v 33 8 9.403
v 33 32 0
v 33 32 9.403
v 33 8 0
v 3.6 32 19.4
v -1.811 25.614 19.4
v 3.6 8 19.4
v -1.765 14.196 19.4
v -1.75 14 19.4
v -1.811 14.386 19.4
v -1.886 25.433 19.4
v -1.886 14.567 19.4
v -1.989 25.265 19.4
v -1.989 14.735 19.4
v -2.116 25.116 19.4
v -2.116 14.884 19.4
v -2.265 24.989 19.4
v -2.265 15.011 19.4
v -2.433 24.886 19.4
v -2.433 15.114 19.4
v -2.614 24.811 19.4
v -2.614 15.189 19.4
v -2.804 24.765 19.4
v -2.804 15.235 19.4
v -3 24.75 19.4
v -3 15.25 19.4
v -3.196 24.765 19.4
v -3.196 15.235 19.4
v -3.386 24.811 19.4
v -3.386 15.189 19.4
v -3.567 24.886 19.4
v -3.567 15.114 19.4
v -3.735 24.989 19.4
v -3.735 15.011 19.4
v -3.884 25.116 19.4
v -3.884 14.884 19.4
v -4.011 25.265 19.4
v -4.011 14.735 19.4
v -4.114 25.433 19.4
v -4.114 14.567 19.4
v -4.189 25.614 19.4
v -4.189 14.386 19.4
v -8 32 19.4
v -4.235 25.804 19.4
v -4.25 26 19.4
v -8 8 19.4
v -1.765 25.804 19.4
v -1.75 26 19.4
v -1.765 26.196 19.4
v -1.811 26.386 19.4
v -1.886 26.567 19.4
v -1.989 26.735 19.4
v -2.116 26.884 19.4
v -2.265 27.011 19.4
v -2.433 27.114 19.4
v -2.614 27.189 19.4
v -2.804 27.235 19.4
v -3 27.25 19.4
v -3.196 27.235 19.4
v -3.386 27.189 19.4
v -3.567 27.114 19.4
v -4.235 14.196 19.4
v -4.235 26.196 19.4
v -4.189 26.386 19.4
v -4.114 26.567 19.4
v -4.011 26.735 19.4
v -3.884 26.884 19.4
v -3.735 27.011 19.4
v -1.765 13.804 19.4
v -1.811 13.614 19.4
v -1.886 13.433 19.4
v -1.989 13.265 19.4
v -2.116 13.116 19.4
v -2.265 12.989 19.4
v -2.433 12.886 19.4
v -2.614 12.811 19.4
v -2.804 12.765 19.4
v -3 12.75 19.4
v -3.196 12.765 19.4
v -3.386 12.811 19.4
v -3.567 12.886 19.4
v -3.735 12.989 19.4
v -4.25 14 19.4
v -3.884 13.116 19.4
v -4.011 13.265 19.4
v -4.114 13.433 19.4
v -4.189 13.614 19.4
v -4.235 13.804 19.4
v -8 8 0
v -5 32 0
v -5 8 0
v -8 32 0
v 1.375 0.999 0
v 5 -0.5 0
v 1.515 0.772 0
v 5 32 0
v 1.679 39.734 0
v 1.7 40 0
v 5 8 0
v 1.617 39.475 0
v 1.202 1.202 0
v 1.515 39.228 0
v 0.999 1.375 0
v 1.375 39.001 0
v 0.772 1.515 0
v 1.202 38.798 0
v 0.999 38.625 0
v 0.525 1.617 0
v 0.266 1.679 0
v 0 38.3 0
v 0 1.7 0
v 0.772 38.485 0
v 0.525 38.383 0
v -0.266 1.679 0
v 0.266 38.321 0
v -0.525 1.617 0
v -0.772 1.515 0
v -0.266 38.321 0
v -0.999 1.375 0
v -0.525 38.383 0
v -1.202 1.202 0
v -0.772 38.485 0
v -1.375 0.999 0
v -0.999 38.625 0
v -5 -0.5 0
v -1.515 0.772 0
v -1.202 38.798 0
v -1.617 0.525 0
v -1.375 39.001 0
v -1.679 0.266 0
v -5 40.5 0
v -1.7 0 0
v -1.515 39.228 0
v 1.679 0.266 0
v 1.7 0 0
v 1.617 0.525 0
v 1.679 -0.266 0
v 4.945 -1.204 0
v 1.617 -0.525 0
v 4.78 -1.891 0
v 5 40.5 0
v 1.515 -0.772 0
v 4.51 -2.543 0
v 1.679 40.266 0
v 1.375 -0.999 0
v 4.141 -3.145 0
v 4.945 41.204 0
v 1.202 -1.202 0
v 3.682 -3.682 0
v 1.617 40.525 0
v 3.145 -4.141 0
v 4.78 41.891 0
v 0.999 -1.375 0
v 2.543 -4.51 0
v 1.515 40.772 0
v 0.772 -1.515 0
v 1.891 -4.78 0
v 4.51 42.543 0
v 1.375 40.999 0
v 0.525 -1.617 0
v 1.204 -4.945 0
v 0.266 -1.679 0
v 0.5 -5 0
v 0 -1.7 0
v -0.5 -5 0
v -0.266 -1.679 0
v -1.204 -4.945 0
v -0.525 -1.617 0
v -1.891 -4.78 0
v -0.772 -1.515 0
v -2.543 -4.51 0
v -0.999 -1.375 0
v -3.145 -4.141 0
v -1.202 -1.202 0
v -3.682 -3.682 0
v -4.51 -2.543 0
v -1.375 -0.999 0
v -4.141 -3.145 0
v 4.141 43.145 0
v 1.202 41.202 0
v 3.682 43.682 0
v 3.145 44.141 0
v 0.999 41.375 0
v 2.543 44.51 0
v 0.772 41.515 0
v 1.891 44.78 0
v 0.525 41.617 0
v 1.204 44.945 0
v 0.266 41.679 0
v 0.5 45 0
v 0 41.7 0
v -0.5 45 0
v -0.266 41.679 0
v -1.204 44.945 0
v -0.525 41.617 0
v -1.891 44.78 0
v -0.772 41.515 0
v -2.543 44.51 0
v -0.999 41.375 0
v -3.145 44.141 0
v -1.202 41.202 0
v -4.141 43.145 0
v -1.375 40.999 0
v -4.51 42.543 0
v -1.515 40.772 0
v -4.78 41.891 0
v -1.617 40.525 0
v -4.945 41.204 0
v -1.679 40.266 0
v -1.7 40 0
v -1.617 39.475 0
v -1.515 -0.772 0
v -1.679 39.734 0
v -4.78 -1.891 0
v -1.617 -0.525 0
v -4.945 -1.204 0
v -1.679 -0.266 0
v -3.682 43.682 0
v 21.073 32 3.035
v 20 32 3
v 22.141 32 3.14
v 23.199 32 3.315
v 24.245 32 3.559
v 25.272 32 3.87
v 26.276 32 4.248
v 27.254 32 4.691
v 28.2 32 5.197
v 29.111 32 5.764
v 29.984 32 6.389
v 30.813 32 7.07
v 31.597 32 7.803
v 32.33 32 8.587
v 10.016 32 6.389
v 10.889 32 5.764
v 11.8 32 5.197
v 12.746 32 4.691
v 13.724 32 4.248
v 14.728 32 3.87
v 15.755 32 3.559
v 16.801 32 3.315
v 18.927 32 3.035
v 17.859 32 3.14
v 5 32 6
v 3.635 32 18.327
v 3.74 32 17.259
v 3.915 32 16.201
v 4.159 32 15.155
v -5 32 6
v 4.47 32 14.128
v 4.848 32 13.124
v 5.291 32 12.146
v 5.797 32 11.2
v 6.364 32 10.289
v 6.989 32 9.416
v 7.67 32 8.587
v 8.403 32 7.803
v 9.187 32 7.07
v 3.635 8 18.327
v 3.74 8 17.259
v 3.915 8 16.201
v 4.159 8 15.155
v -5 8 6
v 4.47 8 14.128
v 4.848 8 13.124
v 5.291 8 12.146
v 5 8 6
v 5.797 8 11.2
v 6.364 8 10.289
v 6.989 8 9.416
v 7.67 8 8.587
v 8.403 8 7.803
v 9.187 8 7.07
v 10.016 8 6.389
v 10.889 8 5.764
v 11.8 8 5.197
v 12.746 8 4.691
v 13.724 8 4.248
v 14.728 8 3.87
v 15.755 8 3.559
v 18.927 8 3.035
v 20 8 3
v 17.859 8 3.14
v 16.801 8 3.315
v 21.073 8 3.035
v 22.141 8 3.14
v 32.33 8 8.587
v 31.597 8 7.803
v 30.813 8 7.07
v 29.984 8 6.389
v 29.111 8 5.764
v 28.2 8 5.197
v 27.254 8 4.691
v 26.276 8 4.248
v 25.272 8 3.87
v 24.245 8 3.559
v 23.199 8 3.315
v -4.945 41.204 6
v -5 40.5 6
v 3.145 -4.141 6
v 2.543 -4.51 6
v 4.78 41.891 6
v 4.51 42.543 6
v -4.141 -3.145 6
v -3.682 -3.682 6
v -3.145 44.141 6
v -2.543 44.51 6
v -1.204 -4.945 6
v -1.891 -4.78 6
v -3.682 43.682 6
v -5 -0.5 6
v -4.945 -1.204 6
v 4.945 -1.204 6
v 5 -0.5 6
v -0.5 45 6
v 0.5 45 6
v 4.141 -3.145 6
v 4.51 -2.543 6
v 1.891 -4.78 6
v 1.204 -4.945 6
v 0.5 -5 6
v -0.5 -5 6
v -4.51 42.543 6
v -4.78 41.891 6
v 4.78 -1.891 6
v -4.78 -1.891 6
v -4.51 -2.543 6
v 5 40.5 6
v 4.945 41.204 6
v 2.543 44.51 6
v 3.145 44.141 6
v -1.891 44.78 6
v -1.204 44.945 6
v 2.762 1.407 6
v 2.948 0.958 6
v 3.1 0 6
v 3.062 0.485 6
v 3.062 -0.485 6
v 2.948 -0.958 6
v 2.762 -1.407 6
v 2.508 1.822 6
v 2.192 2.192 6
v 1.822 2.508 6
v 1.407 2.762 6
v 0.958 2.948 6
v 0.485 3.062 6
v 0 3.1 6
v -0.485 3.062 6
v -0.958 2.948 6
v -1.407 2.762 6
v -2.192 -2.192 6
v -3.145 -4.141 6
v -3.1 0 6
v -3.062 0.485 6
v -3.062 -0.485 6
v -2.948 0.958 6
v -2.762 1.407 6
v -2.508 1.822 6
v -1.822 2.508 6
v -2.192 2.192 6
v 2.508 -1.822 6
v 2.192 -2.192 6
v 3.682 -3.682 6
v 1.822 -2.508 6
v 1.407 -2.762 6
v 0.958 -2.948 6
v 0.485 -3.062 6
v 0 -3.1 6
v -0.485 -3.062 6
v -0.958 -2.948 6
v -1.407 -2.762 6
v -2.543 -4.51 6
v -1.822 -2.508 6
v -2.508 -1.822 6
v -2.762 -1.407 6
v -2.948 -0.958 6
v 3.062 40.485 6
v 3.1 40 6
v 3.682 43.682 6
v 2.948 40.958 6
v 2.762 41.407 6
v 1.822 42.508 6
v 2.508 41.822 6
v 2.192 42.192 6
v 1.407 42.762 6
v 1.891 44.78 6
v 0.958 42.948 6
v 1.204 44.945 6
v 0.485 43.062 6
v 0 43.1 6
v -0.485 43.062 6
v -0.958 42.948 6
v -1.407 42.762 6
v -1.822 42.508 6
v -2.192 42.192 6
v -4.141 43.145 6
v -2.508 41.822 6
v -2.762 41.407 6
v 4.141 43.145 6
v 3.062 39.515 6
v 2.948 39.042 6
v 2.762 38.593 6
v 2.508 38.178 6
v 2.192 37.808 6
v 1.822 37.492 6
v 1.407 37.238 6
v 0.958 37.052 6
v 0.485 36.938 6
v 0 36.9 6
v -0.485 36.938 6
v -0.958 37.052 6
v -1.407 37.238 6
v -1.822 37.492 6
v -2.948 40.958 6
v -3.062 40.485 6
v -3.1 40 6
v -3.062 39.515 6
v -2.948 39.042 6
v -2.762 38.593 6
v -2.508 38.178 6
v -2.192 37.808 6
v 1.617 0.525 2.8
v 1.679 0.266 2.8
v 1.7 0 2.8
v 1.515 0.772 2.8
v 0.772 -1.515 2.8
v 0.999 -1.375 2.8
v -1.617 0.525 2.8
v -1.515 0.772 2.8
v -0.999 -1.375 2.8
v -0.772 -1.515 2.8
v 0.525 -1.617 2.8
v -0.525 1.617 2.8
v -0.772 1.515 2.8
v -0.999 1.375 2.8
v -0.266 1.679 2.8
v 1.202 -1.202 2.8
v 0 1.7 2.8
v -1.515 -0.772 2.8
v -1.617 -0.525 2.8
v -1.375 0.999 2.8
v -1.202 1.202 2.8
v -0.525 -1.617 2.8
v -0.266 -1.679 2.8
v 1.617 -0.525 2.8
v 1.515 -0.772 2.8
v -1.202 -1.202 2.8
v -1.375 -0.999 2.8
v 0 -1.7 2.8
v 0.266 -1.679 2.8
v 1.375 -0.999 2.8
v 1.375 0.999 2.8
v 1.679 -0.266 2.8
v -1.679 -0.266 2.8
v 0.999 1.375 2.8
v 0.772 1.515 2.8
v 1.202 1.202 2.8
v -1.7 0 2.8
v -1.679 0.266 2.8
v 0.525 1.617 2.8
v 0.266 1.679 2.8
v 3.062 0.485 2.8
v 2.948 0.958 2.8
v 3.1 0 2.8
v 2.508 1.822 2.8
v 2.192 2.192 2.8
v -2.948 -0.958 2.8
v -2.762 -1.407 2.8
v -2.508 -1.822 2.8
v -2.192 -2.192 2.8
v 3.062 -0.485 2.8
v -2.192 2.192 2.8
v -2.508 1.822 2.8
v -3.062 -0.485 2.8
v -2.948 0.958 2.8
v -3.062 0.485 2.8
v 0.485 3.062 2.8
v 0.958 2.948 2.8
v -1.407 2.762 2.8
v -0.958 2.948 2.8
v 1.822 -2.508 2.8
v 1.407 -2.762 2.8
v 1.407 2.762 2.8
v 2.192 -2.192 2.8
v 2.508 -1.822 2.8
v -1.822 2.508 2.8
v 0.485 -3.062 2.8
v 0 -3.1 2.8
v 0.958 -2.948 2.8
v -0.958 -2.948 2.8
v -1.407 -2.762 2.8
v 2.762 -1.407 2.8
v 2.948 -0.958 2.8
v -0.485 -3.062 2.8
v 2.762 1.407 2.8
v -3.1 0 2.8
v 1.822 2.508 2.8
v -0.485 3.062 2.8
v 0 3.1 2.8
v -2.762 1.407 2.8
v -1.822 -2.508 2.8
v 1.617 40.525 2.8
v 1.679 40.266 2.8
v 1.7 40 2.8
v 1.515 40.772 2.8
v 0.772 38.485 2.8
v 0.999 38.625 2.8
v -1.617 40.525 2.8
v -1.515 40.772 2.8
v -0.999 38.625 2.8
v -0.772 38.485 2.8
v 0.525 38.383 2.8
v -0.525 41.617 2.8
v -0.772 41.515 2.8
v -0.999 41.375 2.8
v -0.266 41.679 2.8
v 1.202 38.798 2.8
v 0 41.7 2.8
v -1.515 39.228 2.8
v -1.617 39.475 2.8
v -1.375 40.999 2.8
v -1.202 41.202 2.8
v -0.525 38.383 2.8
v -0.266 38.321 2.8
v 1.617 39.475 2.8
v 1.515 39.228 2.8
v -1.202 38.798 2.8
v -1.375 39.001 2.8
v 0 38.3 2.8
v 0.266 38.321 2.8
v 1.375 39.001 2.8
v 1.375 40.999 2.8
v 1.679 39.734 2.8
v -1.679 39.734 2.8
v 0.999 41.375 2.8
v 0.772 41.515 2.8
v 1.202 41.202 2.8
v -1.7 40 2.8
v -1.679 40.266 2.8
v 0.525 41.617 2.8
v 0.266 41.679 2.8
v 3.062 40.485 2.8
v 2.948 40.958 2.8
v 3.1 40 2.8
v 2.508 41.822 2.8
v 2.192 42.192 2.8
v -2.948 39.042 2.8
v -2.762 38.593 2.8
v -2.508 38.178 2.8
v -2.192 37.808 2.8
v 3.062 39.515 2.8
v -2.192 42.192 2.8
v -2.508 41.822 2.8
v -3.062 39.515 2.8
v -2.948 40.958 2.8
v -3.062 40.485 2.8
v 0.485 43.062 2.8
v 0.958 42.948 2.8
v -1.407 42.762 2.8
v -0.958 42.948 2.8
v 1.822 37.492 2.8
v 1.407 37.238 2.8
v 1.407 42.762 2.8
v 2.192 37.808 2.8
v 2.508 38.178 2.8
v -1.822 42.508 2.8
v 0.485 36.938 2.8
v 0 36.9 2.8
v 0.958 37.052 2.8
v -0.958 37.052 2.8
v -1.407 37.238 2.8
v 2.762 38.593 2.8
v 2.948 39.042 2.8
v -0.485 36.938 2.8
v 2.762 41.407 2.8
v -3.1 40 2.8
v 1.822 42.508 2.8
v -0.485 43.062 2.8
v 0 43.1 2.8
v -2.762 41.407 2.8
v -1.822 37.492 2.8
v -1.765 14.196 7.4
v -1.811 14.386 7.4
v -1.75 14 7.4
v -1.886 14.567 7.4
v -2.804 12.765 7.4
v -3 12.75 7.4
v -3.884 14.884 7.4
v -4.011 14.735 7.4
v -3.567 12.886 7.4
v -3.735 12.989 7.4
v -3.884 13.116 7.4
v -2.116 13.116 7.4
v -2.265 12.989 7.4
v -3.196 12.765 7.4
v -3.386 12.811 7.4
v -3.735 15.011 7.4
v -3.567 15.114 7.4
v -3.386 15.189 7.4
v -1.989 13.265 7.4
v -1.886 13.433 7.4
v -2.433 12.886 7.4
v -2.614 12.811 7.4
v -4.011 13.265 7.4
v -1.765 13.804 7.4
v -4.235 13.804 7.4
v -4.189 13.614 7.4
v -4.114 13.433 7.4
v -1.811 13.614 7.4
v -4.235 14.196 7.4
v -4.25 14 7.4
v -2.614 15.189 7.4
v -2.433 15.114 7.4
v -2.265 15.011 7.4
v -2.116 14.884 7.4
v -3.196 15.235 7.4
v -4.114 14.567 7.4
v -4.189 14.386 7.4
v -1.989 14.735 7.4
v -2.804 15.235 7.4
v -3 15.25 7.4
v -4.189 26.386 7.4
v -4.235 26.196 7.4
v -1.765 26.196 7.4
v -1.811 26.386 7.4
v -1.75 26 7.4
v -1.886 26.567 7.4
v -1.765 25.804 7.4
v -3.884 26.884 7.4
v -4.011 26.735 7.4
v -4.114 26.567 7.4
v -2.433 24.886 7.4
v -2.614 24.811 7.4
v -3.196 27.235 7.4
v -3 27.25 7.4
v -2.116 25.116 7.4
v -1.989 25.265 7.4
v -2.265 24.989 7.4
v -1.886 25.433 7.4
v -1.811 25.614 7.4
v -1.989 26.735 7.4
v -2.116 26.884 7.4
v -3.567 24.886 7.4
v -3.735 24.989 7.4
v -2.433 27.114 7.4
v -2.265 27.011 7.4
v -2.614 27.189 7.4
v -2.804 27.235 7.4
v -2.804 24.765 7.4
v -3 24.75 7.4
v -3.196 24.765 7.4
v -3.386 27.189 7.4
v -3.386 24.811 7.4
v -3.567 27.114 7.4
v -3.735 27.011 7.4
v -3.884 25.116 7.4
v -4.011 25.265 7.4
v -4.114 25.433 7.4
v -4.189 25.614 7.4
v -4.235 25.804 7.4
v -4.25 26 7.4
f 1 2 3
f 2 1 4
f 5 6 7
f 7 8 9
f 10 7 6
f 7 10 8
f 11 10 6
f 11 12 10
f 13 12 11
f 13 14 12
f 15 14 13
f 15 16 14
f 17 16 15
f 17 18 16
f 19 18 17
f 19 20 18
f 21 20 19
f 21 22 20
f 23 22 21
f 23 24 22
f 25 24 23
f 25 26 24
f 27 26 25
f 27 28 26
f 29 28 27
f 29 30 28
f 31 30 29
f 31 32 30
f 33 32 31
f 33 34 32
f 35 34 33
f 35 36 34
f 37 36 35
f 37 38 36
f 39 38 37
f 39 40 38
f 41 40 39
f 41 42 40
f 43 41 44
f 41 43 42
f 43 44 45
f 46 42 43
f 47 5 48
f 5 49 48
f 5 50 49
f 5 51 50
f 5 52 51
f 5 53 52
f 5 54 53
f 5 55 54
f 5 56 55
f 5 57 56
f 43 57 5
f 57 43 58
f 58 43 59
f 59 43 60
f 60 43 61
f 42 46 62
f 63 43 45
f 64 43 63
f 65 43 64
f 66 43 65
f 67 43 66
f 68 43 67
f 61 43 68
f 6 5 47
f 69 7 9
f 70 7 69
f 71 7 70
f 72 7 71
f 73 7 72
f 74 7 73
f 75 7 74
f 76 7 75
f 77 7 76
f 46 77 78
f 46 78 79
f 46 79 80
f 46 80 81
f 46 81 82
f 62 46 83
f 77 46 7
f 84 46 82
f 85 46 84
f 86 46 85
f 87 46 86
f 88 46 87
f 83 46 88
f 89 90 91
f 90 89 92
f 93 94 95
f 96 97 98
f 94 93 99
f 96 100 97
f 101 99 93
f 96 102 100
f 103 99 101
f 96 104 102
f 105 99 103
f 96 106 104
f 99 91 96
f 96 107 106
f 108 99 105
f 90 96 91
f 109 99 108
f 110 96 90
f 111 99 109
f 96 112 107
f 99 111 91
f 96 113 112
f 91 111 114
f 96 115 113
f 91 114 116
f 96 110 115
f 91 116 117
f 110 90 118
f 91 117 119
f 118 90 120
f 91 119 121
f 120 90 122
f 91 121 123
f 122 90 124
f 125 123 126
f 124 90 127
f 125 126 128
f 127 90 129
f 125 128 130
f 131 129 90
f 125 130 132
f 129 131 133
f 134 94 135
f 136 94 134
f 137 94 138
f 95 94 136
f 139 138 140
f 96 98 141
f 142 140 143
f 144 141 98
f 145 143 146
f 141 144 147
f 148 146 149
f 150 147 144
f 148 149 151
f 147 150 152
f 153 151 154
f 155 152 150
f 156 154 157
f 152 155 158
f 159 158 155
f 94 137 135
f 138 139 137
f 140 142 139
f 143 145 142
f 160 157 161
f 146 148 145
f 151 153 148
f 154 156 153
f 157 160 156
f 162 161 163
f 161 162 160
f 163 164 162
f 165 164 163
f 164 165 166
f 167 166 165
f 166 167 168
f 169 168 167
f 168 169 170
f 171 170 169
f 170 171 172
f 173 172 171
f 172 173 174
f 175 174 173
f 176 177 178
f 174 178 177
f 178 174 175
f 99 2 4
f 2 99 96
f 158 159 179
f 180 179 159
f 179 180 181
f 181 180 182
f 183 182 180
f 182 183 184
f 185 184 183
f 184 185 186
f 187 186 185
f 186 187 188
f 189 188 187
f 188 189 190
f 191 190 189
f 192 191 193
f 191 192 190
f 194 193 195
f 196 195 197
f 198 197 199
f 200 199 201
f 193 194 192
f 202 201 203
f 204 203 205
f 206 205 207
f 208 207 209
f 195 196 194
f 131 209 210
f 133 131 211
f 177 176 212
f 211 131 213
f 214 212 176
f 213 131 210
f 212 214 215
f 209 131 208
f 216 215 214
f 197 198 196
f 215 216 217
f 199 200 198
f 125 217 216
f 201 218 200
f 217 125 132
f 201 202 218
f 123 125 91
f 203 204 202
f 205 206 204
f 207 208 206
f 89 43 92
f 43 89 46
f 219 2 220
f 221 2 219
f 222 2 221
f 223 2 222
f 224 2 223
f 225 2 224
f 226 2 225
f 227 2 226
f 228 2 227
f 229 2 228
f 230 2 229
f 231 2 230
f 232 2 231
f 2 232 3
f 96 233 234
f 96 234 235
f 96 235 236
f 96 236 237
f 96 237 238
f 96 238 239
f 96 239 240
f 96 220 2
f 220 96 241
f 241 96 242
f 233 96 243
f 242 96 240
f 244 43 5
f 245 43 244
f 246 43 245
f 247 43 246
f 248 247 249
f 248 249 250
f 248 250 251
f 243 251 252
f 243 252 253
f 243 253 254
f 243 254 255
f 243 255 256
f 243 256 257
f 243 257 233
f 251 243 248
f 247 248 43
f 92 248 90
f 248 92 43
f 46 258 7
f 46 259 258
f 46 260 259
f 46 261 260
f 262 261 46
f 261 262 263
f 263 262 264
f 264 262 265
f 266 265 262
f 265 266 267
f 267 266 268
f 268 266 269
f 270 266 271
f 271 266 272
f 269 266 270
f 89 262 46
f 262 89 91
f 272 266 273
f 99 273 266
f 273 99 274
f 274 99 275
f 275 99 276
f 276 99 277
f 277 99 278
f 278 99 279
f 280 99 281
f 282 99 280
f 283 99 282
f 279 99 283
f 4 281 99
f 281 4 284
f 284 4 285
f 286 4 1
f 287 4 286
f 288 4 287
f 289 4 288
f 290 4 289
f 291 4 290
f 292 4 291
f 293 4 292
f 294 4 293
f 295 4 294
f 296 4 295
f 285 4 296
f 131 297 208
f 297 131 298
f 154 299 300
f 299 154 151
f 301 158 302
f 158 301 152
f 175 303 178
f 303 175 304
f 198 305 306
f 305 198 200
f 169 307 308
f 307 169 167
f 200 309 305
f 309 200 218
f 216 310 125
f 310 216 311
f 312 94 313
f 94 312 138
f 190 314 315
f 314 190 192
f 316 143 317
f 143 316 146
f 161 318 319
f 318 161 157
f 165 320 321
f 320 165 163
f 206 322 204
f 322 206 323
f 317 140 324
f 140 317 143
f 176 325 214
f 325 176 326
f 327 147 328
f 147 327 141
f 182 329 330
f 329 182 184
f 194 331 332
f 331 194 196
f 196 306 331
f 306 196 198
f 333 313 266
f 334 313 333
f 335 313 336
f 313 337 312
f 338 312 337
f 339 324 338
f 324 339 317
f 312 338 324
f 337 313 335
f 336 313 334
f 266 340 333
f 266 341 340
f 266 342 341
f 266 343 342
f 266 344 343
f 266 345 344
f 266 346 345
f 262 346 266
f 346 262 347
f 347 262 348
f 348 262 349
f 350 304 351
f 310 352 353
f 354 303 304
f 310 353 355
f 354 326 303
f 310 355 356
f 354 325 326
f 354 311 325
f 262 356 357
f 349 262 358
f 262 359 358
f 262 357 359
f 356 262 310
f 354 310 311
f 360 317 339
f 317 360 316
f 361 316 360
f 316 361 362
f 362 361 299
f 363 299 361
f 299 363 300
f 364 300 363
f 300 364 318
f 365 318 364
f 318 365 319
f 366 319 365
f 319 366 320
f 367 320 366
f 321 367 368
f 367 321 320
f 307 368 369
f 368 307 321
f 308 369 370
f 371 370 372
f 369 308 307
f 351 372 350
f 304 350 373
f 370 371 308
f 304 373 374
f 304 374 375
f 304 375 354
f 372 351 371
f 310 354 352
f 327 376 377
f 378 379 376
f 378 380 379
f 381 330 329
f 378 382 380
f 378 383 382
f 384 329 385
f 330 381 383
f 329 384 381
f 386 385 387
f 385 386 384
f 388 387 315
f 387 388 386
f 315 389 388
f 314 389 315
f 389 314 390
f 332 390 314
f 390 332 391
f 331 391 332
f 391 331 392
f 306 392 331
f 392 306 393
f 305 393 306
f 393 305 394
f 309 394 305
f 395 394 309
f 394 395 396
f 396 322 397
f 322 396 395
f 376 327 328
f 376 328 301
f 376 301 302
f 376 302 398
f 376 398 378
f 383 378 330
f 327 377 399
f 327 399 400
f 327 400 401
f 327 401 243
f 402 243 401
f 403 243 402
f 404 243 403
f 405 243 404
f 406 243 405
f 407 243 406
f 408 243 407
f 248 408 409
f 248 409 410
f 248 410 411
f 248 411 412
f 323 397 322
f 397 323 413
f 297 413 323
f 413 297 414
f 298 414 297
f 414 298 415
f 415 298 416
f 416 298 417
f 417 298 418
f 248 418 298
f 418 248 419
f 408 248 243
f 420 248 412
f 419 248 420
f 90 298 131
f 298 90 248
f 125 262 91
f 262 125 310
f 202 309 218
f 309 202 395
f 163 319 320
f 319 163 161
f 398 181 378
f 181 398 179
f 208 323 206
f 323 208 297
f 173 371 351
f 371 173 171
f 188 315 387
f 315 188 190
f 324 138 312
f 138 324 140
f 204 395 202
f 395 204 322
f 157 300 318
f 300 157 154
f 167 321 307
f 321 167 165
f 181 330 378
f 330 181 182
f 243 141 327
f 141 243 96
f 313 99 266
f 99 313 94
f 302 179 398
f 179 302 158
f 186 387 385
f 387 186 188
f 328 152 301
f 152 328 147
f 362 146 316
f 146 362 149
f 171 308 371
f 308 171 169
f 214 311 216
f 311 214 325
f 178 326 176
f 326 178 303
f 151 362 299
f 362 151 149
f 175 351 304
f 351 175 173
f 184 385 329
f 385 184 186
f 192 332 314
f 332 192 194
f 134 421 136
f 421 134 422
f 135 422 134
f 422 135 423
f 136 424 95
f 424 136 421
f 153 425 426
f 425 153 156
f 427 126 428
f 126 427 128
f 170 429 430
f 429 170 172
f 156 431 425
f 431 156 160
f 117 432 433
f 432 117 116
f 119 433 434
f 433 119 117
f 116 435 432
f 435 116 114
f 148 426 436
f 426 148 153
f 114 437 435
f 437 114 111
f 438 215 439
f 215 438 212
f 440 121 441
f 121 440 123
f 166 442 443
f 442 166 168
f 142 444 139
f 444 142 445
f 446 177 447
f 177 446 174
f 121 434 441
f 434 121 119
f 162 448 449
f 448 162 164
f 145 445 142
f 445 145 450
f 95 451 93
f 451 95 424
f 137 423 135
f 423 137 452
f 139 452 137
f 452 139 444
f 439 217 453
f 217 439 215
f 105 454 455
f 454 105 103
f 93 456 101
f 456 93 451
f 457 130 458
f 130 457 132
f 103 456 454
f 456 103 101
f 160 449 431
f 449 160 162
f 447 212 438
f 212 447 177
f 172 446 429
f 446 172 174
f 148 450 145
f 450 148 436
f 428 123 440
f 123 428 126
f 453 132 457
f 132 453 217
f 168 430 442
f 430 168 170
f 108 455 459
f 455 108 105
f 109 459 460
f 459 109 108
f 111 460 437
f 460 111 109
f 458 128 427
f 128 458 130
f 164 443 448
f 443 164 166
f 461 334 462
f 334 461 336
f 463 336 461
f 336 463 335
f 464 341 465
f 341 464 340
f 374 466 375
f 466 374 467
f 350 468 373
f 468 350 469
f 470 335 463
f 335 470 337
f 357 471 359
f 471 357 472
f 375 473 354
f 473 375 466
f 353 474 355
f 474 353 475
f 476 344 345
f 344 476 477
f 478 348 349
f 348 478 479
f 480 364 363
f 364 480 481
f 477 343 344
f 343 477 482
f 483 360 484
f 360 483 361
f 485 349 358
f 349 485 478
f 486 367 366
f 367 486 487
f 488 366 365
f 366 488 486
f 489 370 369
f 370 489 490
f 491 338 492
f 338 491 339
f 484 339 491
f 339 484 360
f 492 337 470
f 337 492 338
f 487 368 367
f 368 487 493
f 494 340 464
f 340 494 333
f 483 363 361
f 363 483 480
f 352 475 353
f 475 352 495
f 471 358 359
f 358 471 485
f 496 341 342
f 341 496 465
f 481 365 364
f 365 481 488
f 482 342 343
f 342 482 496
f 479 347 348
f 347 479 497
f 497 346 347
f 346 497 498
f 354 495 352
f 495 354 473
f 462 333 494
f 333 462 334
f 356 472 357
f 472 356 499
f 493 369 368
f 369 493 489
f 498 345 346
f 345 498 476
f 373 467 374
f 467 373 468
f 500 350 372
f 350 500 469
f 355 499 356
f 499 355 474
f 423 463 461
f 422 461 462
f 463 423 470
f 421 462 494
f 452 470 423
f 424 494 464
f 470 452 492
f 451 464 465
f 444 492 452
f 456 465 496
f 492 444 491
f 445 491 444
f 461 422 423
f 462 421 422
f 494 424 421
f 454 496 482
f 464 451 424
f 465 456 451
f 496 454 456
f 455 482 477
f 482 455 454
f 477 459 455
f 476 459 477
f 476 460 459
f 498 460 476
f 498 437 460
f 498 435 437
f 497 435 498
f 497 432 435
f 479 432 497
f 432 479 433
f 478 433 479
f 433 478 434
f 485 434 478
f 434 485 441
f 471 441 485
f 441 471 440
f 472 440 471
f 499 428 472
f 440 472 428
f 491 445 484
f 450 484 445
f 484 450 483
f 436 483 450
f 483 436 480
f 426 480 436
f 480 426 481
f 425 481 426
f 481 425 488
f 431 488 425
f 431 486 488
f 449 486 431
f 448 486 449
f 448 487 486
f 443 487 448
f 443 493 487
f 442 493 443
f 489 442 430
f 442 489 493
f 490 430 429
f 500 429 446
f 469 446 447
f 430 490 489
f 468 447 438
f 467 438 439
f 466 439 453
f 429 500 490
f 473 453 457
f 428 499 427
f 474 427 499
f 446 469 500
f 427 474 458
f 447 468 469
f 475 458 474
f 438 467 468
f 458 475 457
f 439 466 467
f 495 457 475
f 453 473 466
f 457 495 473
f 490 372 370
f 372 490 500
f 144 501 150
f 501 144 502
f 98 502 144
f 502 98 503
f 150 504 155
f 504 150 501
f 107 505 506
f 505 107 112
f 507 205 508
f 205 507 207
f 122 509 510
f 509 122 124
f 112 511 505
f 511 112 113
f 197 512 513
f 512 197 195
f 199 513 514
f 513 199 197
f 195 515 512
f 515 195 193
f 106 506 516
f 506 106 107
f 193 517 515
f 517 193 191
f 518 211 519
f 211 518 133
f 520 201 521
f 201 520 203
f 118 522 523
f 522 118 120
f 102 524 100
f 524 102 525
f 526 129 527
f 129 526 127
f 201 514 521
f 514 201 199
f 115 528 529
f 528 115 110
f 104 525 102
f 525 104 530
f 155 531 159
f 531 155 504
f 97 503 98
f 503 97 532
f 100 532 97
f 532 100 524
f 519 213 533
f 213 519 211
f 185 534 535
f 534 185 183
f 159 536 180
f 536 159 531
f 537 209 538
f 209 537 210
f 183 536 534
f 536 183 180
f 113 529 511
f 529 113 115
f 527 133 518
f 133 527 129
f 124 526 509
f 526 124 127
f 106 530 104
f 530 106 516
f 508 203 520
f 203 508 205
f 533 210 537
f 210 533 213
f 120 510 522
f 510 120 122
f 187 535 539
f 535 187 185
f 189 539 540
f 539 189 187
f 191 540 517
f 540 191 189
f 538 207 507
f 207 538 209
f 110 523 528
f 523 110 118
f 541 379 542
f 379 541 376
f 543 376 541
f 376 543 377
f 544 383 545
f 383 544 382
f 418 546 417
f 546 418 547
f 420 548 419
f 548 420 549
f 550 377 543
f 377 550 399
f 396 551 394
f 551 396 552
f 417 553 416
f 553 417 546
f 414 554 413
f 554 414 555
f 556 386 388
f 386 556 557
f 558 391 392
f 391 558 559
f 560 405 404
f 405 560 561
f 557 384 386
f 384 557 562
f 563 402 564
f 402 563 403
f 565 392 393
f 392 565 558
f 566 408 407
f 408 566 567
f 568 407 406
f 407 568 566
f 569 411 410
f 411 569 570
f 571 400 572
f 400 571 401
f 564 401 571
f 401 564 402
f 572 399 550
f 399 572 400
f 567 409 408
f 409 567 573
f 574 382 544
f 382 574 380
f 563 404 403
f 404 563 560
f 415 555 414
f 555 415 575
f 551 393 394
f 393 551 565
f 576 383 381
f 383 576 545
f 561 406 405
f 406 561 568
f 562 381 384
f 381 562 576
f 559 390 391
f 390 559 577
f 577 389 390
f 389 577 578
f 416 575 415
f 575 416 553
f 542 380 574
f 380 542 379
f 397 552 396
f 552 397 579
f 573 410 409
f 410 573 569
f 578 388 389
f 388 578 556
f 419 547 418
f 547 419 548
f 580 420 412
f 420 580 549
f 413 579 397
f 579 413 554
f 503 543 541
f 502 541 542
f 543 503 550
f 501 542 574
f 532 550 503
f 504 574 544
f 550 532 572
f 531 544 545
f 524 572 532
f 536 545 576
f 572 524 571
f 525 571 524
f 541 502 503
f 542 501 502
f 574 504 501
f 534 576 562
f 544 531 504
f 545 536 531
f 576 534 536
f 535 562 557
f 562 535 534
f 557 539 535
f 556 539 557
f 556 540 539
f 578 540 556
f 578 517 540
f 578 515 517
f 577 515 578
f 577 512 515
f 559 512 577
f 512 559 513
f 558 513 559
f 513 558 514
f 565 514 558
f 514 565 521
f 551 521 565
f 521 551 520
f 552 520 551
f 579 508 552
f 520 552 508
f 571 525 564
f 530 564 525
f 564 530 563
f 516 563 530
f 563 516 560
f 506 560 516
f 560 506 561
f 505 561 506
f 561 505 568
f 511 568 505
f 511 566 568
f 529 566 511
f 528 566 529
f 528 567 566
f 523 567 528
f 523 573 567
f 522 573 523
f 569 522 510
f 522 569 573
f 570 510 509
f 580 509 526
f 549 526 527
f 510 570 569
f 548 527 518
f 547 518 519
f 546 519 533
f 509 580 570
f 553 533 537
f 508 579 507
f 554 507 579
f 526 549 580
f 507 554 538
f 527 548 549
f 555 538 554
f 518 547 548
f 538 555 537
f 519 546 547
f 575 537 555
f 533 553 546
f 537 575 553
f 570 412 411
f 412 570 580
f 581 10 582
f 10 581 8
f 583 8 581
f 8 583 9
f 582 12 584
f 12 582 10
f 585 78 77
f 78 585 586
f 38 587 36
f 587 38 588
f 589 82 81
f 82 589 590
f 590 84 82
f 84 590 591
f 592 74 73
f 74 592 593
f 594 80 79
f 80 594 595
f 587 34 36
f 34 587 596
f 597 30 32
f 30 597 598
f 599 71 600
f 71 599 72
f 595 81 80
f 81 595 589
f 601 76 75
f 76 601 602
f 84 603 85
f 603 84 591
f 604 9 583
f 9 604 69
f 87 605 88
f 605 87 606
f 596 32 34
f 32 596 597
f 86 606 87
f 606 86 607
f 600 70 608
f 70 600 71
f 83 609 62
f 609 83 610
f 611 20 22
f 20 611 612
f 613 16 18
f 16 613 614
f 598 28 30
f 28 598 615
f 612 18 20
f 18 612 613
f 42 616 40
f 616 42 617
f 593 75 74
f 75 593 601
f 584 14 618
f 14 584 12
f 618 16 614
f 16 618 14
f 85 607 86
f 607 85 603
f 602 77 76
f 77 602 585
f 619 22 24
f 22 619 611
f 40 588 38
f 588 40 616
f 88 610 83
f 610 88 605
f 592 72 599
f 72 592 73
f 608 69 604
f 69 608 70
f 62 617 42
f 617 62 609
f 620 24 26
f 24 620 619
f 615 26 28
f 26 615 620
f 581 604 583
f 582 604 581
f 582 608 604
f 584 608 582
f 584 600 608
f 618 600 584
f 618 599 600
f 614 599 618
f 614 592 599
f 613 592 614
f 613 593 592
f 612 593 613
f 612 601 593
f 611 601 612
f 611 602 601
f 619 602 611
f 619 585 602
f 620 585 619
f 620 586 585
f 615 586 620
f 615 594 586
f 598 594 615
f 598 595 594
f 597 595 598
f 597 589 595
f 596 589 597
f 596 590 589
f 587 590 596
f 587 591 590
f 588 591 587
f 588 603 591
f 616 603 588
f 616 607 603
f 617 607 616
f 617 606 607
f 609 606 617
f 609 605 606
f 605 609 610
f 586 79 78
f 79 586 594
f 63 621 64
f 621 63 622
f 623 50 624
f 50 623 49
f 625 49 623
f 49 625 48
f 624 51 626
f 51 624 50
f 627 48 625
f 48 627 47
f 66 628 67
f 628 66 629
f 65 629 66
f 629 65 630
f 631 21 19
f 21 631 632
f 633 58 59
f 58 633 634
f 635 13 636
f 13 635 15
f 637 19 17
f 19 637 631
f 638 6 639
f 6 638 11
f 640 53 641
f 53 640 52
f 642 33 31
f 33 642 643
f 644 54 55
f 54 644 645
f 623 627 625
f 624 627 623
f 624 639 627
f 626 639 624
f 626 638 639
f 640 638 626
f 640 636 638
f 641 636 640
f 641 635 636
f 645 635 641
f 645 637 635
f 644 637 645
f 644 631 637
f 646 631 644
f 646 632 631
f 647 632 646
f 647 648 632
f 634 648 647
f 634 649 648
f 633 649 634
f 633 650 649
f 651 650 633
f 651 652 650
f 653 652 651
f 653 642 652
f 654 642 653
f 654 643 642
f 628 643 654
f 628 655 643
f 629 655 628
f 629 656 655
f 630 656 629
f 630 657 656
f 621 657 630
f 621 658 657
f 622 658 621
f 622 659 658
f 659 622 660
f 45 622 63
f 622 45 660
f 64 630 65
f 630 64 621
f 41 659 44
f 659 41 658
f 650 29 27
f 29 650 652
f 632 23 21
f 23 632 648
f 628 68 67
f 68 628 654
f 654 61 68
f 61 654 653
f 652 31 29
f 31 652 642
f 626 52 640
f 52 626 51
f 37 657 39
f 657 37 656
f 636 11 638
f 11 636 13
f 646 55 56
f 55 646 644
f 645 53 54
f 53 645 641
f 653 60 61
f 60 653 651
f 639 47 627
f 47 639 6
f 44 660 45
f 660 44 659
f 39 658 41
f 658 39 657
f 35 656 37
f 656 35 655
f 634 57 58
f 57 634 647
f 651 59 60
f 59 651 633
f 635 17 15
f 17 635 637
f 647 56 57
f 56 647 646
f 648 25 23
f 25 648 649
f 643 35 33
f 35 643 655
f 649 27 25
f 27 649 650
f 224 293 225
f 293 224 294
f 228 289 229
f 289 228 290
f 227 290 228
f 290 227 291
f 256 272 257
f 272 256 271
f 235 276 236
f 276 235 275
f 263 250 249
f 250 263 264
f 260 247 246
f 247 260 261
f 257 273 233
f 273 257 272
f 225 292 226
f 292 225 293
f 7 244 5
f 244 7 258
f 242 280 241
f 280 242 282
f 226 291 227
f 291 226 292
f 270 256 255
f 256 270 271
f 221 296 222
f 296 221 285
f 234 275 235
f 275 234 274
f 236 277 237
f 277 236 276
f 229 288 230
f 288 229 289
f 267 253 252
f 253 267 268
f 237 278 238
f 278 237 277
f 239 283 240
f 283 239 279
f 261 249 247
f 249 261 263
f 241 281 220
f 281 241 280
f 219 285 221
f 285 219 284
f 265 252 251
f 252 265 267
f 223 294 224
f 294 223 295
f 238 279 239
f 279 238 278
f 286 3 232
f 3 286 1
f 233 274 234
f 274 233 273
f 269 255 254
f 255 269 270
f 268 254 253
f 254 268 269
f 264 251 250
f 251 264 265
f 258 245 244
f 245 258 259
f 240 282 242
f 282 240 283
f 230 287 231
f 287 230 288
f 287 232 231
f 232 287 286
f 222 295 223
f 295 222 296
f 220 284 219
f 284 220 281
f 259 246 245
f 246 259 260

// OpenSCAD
include <../lib/apache-case-modules-lib.scad>;
$fn = 40;
clip_print();
